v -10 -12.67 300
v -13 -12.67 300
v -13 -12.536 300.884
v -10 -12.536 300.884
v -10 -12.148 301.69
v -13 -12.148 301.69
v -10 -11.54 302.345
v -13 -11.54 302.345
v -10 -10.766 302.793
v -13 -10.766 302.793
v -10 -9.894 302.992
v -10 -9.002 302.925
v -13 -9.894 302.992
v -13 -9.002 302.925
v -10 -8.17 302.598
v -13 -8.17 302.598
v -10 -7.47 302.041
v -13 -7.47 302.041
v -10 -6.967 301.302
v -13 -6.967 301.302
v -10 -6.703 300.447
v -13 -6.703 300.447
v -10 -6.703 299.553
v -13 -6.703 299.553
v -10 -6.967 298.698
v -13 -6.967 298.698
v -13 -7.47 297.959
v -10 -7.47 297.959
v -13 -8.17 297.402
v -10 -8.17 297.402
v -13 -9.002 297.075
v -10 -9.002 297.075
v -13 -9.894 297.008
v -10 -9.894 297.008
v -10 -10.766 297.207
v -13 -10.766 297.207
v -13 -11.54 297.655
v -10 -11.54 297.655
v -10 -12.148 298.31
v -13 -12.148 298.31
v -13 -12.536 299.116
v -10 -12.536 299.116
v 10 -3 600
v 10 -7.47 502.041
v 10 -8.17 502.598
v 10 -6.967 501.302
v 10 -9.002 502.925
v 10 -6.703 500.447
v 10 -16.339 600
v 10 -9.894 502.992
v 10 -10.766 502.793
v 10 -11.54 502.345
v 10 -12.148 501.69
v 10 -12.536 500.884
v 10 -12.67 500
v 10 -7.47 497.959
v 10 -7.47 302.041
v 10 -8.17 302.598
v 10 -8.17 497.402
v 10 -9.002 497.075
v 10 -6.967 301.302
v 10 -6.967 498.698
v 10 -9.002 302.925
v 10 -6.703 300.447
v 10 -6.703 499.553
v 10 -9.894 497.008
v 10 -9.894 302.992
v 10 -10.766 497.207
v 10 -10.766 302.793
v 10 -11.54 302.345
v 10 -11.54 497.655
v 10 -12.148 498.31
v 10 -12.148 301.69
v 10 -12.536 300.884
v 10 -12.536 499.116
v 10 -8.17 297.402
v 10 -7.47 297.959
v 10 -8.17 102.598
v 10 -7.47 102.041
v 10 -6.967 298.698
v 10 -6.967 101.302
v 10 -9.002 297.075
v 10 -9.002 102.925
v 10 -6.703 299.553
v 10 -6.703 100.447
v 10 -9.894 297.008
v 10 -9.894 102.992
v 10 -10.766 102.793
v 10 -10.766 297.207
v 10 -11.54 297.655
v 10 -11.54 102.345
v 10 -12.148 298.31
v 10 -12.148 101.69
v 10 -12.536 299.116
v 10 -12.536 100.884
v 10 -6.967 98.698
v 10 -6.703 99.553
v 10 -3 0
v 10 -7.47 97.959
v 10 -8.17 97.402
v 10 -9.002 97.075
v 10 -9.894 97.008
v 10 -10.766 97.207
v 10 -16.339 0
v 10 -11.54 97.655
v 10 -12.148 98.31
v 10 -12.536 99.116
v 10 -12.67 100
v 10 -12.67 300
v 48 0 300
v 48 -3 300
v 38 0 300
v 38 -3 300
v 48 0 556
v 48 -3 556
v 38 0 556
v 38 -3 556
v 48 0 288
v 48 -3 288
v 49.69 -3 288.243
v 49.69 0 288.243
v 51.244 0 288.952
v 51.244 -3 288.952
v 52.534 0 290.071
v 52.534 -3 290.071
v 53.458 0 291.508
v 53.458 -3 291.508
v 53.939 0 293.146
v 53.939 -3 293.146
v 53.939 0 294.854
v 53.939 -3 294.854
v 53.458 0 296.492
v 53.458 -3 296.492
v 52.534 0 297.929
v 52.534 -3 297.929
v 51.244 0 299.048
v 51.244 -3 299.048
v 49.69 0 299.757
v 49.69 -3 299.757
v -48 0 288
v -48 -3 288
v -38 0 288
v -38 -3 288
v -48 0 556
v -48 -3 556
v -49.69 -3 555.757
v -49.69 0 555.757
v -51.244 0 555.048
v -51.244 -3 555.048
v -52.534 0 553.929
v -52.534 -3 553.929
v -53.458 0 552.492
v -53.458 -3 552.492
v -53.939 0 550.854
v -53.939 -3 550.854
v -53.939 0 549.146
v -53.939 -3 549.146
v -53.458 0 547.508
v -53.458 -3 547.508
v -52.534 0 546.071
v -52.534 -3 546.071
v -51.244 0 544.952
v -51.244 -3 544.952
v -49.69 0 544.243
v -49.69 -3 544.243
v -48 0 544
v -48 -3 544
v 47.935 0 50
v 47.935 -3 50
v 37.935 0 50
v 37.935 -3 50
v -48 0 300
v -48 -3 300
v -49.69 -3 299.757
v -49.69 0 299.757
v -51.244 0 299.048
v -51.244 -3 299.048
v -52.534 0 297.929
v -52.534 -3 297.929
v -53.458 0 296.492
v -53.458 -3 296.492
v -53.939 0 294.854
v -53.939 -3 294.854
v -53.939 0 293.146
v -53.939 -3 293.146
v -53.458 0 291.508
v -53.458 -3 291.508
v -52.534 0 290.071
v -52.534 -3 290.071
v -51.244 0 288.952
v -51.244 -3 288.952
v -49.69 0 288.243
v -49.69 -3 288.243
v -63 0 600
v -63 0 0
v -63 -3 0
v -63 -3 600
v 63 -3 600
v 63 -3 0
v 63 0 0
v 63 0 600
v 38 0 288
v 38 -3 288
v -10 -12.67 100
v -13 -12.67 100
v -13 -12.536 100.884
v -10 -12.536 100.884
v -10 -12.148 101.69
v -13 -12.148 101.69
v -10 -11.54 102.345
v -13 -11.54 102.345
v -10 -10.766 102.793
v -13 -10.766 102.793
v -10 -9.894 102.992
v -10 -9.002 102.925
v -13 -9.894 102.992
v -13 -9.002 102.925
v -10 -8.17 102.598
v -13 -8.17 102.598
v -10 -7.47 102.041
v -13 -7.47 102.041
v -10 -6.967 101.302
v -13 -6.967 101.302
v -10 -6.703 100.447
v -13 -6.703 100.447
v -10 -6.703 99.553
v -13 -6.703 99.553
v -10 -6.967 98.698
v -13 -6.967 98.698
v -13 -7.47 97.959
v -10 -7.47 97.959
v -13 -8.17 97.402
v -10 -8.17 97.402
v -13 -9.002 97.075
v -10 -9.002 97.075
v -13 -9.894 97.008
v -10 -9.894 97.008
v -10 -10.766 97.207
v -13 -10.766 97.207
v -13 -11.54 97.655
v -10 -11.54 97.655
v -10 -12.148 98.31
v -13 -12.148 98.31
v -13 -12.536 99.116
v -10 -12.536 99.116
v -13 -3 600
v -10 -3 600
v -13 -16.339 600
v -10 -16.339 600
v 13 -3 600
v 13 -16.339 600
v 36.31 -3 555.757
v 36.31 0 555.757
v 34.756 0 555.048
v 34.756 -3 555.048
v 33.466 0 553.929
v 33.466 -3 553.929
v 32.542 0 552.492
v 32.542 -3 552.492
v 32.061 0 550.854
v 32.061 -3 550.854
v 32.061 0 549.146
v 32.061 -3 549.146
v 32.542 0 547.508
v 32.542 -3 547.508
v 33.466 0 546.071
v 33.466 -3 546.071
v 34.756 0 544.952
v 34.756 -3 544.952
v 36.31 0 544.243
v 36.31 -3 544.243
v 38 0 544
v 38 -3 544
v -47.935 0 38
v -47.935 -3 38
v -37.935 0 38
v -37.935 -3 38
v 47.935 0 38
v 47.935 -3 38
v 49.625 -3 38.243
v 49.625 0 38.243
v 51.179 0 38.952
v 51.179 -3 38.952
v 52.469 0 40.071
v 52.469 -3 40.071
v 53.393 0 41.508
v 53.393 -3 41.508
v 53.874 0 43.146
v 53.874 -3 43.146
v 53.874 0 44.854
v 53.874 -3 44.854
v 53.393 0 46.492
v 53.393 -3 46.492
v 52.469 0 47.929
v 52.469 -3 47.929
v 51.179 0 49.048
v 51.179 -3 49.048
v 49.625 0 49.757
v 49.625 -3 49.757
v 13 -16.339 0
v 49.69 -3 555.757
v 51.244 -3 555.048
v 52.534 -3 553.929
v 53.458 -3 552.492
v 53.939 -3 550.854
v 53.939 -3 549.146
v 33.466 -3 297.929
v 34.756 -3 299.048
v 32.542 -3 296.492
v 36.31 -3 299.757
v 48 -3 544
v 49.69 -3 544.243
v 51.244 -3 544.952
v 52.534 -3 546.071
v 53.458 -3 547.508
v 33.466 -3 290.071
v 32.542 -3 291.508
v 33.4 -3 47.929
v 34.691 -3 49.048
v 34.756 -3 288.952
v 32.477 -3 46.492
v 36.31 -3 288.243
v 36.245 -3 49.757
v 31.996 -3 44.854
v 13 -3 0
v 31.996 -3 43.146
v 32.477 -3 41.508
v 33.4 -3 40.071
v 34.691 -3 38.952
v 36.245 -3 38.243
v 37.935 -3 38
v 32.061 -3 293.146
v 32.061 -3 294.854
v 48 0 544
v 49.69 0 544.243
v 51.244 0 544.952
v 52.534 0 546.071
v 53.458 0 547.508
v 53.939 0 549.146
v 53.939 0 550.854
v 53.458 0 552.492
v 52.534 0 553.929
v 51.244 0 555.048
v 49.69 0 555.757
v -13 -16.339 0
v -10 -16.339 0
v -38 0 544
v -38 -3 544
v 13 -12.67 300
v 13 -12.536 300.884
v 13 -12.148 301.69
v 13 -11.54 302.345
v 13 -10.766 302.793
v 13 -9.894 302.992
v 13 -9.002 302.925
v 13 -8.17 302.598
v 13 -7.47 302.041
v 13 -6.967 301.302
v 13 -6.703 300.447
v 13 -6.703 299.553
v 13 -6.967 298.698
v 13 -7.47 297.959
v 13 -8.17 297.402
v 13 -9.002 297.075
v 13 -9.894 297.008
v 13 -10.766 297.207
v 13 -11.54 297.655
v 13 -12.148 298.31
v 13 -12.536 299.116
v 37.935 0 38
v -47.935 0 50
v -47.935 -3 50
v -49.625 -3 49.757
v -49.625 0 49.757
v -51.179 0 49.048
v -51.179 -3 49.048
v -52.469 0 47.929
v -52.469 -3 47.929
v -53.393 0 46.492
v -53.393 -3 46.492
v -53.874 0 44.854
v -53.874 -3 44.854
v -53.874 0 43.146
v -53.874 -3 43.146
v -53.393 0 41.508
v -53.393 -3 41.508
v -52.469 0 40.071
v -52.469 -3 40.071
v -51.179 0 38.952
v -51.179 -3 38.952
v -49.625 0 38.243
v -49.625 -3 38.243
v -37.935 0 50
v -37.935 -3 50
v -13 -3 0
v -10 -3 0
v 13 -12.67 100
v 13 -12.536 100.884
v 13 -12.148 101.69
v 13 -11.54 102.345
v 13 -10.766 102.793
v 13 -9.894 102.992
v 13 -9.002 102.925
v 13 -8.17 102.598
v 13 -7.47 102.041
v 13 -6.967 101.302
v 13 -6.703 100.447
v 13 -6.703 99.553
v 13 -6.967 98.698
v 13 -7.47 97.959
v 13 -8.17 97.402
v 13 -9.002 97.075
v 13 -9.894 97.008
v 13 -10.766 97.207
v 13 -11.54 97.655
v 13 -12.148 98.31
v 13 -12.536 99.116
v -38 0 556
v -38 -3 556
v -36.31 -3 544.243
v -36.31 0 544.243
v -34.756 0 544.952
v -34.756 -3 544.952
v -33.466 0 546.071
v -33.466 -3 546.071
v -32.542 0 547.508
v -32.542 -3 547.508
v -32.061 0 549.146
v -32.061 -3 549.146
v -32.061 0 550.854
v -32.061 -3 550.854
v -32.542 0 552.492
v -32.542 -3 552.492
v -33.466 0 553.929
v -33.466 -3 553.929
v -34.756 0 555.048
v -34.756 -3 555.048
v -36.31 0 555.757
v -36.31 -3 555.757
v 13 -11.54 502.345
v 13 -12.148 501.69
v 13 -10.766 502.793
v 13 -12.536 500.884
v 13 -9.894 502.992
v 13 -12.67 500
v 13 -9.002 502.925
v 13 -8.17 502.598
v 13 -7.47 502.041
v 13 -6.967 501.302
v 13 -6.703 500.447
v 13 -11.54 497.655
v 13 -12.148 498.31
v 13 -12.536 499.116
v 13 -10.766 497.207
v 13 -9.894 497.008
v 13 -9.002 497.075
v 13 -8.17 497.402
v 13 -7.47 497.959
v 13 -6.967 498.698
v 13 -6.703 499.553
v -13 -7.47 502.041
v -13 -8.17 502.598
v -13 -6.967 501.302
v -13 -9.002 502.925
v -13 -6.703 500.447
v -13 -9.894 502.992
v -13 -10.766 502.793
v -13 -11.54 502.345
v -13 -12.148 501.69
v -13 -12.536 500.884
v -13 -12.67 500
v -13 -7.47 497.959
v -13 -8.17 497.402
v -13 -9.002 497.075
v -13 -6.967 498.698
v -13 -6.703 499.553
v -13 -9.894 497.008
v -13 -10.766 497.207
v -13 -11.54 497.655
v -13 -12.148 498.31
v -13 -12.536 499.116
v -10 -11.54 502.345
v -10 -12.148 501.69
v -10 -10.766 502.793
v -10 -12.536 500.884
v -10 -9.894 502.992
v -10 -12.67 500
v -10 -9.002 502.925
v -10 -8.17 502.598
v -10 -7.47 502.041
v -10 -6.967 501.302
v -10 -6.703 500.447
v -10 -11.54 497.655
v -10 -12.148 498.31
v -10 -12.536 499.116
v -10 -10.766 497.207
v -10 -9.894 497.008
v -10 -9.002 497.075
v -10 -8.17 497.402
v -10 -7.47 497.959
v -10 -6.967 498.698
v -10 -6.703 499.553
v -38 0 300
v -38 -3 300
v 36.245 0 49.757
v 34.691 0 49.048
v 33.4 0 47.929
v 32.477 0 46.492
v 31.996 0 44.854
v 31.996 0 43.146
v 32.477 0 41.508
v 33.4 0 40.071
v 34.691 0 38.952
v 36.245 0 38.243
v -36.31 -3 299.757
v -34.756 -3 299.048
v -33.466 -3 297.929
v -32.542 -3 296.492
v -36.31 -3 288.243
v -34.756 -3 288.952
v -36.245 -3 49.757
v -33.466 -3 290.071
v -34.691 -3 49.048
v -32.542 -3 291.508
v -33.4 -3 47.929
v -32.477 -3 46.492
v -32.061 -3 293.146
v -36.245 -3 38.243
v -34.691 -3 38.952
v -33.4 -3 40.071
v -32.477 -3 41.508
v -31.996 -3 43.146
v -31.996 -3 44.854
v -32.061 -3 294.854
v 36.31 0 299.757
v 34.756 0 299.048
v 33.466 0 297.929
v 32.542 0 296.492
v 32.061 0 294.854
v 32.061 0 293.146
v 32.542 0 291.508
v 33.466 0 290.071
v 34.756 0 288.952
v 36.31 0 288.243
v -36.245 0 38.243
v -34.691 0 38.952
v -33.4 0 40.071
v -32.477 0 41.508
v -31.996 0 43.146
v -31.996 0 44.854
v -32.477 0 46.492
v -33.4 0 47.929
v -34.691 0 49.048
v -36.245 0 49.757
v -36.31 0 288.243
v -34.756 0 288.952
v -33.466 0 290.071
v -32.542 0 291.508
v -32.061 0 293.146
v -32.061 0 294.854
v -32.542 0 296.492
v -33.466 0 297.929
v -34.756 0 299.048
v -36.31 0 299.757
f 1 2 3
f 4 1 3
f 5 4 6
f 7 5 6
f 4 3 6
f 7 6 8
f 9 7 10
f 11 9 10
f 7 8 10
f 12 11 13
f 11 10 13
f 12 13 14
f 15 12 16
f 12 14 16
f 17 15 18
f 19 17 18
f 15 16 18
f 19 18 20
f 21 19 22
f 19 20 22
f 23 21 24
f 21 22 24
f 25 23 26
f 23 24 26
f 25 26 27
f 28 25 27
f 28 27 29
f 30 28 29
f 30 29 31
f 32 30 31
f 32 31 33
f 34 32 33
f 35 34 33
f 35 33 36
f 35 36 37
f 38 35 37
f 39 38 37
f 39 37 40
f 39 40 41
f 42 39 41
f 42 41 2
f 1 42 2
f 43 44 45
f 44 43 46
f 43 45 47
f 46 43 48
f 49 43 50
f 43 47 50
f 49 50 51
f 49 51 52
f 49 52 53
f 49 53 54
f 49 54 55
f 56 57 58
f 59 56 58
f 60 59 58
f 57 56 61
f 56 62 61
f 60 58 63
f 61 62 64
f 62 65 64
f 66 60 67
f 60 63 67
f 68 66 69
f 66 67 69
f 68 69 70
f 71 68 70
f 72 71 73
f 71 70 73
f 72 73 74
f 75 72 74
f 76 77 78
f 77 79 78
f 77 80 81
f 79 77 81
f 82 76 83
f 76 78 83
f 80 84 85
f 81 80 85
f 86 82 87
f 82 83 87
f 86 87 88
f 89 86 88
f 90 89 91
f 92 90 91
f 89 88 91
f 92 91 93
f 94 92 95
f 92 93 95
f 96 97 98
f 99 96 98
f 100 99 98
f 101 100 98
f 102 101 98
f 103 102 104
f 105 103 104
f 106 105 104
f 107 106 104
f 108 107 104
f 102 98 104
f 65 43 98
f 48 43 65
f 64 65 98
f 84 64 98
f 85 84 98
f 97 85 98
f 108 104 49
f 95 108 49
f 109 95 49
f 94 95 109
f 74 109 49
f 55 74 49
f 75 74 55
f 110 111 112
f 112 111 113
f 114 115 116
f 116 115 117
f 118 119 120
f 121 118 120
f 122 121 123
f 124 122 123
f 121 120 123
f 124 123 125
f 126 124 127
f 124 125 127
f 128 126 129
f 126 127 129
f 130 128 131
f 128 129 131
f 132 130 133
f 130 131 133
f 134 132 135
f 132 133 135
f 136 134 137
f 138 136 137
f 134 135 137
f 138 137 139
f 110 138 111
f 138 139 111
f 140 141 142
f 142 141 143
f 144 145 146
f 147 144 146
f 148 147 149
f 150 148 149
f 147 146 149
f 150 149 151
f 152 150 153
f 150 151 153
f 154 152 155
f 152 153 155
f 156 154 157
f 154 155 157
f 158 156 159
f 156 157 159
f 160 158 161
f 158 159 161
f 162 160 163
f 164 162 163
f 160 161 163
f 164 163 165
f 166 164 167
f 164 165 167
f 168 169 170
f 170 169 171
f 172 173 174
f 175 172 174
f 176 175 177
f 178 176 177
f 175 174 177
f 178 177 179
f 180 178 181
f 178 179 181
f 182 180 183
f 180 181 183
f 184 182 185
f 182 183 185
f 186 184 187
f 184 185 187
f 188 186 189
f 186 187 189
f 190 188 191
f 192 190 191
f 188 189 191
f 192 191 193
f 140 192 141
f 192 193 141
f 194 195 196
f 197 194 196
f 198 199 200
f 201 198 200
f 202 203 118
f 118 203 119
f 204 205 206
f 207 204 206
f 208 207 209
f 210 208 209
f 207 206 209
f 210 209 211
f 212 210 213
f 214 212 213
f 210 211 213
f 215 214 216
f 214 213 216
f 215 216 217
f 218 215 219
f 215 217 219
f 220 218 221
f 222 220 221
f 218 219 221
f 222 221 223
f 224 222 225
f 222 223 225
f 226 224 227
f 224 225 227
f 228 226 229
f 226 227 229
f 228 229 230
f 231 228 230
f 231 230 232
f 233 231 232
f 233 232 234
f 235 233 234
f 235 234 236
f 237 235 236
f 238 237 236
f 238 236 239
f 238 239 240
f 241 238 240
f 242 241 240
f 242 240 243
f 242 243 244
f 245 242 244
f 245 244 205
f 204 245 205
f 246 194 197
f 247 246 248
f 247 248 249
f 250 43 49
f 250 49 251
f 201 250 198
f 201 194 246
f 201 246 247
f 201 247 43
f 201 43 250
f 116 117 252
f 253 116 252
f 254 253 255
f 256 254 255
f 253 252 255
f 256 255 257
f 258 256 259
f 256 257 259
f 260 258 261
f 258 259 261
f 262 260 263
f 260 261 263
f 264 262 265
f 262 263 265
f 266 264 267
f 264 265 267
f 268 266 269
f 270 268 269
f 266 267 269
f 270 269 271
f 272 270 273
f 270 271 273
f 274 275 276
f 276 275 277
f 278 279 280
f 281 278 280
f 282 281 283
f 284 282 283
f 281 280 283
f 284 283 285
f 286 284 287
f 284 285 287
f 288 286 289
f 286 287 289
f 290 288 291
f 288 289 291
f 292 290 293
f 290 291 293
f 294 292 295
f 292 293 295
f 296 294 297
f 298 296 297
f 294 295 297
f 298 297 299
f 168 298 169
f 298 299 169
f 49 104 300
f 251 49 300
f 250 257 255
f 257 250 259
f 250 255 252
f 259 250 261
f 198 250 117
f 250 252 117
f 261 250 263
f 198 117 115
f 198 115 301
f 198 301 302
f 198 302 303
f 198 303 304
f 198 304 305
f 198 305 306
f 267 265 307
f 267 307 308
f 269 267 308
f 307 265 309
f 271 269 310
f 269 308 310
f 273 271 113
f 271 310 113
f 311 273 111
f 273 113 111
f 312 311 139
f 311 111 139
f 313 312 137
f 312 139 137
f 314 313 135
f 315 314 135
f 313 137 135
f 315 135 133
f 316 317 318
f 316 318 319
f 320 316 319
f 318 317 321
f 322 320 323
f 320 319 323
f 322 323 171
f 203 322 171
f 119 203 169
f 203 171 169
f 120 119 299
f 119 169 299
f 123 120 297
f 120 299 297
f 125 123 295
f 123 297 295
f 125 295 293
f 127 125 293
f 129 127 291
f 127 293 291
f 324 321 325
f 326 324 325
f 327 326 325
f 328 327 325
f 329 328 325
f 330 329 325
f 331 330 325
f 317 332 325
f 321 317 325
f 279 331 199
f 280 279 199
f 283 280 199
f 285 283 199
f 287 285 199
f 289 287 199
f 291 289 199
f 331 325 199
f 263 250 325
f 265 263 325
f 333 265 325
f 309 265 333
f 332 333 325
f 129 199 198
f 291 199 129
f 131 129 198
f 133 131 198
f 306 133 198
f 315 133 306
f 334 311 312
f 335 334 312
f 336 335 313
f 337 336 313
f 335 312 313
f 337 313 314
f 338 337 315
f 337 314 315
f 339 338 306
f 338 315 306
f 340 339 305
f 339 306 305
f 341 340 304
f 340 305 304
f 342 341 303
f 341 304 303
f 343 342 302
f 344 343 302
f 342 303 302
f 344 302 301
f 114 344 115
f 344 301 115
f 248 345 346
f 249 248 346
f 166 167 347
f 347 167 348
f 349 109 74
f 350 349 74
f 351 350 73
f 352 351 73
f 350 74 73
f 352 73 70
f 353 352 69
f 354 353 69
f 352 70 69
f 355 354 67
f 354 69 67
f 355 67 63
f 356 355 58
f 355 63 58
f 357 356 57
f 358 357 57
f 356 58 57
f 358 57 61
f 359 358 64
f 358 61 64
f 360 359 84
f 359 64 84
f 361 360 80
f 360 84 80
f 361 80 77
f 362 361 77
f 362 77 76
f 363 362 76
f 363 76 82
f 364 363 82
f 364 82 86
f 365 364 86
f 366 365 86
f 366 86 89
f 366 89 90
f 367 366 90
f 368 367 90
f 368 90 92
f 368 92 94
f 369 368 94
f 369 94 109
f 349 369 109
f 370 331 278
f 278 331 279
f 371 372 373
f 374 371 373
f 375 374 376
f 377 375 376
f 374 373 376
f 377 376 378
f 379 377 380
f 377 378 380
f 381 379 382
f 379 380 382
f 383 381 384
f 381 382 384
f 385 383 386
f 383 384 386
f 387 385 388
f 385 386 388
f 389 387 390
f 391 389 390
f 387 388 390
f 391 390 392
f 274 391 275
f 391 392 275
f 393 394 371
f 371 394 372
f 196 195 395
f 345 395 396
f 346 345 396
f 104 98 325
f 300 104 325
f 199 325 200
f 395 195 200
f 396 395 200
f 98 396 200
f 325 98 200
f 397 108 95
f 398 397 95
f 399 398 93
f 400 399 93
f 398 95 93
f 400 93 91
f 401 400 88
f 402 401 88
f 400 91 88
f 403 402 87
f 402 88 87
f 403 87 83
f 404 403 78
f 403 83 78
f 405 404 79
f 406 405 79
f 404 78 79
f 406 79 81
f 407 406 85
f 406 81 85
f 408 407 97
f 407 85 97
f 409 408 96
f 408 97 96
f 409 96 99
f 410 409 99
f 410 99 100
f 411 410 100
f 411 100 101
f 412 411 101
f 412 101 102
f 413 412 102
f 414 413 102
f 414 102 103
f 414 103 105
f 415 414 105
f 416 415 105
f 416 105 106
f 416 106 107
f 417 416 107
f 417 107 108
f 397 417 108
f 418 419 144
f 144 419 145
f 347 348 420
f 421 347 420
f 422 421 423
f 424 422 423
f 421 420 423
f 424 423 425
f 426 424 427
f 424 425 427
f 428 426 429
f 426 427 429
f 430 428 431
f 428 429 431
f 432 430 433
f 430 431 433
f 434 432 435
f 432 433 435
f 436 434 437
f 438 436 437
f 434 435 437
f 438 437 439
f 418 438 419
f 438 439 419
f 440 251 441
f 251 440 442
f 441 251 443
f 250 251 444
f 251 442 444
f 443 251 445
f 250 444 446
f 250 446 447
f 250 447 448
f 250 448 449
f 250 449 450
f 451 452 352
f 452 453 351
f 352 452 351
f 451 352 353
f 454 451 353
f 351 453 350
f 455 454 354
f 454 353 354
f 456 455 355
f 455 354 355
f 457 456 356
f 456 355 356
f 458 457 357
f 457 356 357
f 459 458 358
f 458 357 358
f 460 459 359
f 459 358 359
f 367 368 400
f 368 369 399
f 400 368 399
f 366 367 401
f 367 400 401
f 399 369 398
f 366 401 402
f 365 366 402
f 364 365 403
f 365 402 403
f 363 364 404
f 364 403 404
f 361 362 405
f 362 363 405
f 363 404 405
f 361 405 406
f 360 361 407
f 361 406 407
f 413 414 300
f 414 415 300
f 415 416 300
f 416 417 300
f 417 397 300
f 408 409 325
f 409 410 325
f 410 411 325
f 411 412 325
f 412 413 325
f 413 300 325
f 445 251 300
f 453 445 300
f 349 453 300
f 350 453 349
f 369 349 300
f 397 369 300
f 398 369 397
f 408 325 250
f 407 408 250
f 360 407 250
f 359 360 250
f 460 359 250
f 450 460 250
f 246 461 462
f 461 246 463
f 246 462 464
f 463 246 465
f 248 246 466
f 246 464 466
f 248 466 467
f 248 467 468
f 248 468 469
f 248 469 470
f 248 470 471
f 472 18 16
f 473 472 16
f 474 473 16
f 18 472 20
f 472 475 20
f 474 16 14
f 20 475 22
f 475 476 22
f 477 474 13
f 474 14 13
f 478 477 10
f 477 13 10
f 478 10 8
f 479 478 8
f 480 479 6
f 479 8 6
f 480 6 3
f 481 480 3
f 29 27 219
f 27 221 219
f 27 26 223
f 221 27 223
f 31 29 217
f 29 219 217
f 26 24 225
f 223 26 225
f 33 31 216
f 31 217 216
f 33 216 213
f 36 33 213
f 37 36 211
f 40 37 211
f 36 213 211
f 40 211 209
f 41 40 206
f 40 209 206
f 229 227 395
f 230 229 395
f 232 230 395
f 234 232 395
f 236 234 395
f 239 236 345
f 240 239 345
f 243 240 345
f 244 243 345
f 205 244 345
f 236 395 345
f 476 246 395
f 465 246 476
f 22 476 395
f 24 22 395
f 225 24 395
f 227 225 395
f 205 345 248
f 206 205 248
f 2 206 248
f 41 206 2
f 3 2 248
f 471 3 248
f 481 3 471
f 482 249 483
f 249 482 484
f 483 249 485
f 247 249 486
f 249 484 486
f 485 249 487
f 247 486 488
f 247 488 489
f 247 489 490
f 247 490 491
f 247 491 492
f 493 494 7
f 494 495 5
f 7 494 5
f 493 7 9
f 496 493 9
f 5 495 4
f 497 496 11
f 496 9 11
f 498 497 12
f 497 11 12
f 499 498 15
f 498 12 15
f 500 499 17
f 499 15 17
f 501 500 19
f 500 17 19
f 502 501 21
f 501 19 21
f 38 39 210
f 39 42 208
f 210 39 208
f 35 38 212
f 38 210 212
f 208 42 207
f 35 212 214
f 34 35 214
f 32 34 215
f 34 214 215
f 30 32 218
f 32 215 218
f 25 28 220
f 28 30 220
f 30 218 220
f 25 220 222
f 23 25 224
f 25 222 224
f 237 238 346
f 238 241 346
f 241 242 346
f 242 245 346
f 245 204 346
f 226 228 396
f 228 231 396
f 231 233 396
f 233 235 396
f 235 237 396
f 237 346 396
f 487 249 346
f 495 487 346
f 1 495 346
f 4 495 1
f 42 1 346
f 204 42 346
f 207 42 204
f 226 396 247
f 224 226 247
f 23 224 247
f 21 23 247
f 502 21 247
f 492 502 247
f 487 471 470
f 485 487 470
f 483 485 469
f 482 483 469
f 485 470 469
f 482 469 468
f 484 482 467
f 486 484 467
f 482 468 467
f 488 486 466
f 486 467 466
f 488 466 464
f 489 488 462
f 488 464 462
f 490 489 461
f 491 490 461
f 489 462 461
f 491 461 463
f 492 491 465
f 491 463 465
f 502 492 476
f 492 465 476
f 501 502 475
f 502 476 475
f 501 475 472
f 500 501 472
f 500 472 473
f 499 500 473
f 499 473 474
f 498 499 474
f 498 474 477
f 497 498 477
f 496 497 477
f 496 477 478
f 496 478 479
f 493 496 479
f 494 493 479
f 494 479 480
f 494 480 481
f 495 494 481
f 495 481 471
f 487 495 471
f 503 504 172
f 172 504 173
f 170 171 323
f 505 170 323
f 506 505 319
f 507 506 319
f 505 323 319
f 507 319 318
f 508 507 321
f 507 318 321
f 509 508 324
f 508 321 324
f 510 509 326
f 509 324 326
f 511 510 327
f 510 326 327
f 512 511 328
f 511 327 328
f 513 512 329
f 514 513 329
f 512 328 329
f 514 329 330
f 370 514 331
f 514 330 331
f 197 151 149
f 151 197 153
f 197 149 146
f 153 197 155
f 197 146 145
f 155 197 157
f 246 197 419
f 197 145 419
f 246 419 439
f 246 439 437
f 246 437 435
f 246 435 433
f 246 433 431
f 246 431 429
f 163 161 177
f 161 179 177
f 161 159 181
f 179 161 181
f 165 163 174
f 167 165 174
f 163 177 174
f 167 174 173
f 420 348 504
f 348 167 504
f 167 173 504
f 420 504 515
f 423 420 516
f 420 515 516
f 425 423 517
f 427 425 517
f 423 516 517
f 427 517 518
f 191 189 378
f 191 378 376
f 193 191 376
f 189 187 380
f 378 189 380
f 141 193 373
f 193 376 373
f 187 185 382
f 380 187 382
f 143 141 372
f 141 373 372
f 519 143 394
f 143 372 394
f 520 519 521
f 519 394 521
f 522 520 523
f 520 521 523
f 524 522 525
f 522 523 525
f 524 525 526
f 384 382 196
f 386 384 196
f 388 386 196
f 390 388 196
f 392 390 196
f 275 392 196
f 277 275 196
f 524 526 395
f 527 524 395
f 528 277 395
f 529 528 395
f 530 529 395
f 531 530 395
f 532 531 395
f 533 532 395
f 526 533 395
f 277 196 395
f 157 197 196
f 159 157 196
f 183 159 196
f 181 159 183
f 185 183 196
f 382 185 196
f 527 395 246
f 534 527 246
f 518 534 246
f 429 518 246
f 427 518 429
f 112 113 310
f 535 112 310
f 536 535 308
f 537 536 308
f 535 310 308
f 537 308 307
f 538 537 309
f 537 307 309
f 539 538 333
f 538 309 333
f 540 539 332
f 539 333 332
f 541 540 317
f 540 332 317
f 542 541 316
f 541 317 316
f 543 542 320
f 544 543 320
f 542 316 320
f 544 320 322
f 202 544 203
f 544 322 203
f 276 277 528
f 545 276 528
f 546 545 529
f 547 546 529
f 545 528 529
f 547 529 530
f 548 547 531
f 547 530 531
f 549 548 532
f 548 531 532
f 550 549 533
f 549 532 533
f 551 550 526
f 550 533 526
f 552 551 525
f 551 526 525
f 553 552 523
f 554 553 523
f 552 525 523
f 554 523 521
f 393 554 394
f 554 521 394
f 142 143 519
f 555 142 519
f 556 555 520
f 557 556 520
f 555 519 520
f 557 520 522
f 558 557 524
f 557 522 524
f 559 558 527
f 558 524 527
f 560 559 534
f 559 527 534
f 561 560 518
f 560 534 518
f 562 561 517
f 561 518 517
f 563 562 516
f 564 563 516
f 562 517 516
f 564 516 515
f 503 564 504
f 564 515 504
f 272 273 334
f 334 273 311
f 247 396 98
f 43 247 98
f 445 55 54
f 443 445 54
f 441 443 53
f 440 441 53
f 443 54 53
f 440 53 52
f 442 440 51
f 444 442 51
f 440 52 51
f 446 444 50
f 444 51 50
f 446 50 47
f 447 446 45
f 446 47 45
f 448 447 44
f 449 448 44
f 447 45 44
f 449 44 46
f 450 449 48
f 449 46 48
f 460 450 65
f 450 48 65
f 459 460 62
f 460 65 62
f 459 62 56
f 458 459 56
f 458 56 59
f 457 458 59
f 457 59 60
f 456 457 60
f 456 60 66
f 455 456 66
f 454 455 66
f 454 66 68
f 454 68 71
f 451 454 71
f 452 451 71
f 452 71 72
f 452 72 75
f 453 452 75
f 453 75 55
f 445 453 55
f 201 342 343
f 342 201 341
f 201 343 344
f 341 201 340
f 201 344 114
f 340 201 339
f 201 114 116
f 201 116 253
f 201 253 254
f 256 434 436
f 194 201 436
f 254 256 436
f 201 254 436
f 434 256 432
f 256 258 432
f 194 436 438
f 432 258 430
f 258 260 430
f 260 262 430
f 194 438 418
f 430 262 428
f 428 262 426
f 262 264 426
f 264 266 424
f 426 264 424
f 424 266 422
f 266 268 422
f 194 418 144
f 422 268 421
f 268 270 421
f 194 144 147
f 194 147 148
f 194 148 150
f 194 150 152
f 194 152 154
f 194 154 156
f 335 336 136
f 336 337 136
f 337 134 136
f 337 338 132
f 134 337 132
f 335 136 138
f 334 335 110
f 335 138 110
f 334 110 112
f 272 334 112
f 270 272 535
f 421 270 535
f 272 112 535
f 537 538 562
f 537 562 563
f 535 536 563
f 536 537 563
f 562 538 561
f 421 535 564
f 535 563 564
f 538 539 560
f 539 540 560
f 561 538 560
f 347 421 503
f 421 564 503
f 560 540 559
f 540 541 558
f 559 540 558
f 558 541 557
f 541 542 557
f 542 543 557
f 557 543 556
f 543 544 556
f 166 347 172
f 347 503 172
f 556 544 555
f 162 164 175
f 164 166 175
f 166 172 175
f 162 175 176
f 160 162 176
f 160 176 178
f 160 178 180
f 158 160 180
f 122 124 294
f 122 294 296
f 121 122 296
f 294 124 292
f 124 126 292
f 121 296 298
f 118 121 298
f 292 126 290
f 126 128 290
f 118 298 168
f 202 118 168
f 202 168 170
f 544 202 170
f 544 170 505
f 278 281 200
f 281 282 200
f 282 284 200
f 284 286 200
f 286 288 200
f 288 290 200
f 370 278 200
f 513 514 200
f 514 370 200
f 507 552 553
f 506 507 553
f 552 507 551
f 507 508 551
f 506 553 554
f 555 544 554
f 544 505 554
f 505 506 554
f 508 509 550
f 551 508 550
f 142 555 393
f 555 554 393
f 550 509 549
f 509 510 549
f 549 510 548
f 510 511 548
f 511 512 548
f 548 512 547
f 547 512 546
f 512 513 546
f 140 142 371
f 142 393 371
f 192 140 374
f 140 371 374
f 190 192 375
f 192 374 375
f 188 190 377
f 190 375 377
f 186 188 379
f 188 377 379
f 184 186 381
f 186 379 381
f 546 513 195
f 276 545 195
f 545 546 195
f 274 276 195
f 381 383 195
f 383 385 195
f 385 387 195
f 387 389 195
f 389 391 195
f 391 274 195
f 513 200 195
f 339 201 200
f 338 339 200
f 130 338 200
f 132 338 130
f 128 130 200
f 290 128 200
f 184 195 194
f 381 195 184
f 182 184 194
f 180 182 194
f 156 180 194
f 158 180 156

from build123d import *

# Parameters (mm, degrees)
F1_DEPTH = 600
F3_DEPTH = 3.001
F4_R     = 3
F5_DEPTH = 76.001


with BuildPart() as f1:
    # F0 (on Top) → F1 (new body)
    with BuildSketch(Plane.XY):
        Polygon((63, 0), (-63, 0), (-63, -3), (-13, -3), (-13, -16.339283), (-10, -16.339283), (-10, -3), (10, -3), (10, -16.339283), (13, -16.339283), (13, -3), (63, -3), align=None)
    extrude(amount=F1_DEPTH)

    # F2 (on face) → F3 (cut, through all)
    with BuildSketch(Plane.XZ.offset(3)):
        with BuildLine():
            Line((-38, 556), (-48, 556))
            ThreePointArc((-48, 556), (-54, 550), (-48, 544))
            Line((-48, 544), (-38, 544))
            ThreePointArc((-38, 544), (-32, 550), (-38, 556))
        make_face()
        with BuildLine():
            Line((-38, 300), (-48, 300))
            ThreePointArc((-48, 300), (-54, 294), (-48, 288))
            Line((-48, 288), (-38, 288))
            ThreePointArc((-38, 288), (-32, 294), (-38, 300))
        make_face()
        with BuildLine():
            Line((-37.934902, 50), (-47.934902, 50))
            ThreePointArc((-47.934902, 50), (-53.934902, 44), (-47.934902, 38))
            Line((-47.934902, 38), (-37.934902, 38))
            ThreePointArc((-37.934902, 38), (-31.934902, 44), (-37.934902, 50))
        make_face()
        with BuildLine():
            ThreePointArc((47.934902, 38), (53.934902, 44), (47.934902, 50))
            Line((47.934902, 50), (37.934902, 50))
            ThreePointArc((37.934902, 50), (31.934902, 44), (37.934902, 38))
            Line((37.934902, 38), (47.934902, 38))
        make_face()
        with BuildLine():
            ThreePointArc((48, 288), (54, 294), (48, 300))
            Line((48, 300), (38, 300))
            ThreePointArc((38, 300), (32, 294), (38, 288))
            Line((38, 288), (48, 288))
        make_face()
        with BuildLine():
            ThreePointArc((38, 556), (32, 550), (38, 544))
            Line((38, 544), (48, 544))
            ThreePointArc((48, 544), (54, 550), (48, 556))
            Line((48, 556), (38, 556))
        make_face()
    extrude(amount=-F3_DEPTH, mode=Mode.SUBTRACT)

    # F4 (on face) → F5 (cut, through all)
    with BuildSketch(Plane(origin=(-13, 0, 0), x_dir=(0, -1, 0), z_dir=(-1, 0, 0))):
        with Locations((9.669641, 500)):
            Circle(F4_R)
        with Locations((9.669641, 300)):
            Circle(F4_R)
        with Locations((9.669641, 100)):
            Circle(F4_R)
    extrude(amount=-F5_DEPTH, mode=Mode.SUBTRACT)


solid = f1.part
